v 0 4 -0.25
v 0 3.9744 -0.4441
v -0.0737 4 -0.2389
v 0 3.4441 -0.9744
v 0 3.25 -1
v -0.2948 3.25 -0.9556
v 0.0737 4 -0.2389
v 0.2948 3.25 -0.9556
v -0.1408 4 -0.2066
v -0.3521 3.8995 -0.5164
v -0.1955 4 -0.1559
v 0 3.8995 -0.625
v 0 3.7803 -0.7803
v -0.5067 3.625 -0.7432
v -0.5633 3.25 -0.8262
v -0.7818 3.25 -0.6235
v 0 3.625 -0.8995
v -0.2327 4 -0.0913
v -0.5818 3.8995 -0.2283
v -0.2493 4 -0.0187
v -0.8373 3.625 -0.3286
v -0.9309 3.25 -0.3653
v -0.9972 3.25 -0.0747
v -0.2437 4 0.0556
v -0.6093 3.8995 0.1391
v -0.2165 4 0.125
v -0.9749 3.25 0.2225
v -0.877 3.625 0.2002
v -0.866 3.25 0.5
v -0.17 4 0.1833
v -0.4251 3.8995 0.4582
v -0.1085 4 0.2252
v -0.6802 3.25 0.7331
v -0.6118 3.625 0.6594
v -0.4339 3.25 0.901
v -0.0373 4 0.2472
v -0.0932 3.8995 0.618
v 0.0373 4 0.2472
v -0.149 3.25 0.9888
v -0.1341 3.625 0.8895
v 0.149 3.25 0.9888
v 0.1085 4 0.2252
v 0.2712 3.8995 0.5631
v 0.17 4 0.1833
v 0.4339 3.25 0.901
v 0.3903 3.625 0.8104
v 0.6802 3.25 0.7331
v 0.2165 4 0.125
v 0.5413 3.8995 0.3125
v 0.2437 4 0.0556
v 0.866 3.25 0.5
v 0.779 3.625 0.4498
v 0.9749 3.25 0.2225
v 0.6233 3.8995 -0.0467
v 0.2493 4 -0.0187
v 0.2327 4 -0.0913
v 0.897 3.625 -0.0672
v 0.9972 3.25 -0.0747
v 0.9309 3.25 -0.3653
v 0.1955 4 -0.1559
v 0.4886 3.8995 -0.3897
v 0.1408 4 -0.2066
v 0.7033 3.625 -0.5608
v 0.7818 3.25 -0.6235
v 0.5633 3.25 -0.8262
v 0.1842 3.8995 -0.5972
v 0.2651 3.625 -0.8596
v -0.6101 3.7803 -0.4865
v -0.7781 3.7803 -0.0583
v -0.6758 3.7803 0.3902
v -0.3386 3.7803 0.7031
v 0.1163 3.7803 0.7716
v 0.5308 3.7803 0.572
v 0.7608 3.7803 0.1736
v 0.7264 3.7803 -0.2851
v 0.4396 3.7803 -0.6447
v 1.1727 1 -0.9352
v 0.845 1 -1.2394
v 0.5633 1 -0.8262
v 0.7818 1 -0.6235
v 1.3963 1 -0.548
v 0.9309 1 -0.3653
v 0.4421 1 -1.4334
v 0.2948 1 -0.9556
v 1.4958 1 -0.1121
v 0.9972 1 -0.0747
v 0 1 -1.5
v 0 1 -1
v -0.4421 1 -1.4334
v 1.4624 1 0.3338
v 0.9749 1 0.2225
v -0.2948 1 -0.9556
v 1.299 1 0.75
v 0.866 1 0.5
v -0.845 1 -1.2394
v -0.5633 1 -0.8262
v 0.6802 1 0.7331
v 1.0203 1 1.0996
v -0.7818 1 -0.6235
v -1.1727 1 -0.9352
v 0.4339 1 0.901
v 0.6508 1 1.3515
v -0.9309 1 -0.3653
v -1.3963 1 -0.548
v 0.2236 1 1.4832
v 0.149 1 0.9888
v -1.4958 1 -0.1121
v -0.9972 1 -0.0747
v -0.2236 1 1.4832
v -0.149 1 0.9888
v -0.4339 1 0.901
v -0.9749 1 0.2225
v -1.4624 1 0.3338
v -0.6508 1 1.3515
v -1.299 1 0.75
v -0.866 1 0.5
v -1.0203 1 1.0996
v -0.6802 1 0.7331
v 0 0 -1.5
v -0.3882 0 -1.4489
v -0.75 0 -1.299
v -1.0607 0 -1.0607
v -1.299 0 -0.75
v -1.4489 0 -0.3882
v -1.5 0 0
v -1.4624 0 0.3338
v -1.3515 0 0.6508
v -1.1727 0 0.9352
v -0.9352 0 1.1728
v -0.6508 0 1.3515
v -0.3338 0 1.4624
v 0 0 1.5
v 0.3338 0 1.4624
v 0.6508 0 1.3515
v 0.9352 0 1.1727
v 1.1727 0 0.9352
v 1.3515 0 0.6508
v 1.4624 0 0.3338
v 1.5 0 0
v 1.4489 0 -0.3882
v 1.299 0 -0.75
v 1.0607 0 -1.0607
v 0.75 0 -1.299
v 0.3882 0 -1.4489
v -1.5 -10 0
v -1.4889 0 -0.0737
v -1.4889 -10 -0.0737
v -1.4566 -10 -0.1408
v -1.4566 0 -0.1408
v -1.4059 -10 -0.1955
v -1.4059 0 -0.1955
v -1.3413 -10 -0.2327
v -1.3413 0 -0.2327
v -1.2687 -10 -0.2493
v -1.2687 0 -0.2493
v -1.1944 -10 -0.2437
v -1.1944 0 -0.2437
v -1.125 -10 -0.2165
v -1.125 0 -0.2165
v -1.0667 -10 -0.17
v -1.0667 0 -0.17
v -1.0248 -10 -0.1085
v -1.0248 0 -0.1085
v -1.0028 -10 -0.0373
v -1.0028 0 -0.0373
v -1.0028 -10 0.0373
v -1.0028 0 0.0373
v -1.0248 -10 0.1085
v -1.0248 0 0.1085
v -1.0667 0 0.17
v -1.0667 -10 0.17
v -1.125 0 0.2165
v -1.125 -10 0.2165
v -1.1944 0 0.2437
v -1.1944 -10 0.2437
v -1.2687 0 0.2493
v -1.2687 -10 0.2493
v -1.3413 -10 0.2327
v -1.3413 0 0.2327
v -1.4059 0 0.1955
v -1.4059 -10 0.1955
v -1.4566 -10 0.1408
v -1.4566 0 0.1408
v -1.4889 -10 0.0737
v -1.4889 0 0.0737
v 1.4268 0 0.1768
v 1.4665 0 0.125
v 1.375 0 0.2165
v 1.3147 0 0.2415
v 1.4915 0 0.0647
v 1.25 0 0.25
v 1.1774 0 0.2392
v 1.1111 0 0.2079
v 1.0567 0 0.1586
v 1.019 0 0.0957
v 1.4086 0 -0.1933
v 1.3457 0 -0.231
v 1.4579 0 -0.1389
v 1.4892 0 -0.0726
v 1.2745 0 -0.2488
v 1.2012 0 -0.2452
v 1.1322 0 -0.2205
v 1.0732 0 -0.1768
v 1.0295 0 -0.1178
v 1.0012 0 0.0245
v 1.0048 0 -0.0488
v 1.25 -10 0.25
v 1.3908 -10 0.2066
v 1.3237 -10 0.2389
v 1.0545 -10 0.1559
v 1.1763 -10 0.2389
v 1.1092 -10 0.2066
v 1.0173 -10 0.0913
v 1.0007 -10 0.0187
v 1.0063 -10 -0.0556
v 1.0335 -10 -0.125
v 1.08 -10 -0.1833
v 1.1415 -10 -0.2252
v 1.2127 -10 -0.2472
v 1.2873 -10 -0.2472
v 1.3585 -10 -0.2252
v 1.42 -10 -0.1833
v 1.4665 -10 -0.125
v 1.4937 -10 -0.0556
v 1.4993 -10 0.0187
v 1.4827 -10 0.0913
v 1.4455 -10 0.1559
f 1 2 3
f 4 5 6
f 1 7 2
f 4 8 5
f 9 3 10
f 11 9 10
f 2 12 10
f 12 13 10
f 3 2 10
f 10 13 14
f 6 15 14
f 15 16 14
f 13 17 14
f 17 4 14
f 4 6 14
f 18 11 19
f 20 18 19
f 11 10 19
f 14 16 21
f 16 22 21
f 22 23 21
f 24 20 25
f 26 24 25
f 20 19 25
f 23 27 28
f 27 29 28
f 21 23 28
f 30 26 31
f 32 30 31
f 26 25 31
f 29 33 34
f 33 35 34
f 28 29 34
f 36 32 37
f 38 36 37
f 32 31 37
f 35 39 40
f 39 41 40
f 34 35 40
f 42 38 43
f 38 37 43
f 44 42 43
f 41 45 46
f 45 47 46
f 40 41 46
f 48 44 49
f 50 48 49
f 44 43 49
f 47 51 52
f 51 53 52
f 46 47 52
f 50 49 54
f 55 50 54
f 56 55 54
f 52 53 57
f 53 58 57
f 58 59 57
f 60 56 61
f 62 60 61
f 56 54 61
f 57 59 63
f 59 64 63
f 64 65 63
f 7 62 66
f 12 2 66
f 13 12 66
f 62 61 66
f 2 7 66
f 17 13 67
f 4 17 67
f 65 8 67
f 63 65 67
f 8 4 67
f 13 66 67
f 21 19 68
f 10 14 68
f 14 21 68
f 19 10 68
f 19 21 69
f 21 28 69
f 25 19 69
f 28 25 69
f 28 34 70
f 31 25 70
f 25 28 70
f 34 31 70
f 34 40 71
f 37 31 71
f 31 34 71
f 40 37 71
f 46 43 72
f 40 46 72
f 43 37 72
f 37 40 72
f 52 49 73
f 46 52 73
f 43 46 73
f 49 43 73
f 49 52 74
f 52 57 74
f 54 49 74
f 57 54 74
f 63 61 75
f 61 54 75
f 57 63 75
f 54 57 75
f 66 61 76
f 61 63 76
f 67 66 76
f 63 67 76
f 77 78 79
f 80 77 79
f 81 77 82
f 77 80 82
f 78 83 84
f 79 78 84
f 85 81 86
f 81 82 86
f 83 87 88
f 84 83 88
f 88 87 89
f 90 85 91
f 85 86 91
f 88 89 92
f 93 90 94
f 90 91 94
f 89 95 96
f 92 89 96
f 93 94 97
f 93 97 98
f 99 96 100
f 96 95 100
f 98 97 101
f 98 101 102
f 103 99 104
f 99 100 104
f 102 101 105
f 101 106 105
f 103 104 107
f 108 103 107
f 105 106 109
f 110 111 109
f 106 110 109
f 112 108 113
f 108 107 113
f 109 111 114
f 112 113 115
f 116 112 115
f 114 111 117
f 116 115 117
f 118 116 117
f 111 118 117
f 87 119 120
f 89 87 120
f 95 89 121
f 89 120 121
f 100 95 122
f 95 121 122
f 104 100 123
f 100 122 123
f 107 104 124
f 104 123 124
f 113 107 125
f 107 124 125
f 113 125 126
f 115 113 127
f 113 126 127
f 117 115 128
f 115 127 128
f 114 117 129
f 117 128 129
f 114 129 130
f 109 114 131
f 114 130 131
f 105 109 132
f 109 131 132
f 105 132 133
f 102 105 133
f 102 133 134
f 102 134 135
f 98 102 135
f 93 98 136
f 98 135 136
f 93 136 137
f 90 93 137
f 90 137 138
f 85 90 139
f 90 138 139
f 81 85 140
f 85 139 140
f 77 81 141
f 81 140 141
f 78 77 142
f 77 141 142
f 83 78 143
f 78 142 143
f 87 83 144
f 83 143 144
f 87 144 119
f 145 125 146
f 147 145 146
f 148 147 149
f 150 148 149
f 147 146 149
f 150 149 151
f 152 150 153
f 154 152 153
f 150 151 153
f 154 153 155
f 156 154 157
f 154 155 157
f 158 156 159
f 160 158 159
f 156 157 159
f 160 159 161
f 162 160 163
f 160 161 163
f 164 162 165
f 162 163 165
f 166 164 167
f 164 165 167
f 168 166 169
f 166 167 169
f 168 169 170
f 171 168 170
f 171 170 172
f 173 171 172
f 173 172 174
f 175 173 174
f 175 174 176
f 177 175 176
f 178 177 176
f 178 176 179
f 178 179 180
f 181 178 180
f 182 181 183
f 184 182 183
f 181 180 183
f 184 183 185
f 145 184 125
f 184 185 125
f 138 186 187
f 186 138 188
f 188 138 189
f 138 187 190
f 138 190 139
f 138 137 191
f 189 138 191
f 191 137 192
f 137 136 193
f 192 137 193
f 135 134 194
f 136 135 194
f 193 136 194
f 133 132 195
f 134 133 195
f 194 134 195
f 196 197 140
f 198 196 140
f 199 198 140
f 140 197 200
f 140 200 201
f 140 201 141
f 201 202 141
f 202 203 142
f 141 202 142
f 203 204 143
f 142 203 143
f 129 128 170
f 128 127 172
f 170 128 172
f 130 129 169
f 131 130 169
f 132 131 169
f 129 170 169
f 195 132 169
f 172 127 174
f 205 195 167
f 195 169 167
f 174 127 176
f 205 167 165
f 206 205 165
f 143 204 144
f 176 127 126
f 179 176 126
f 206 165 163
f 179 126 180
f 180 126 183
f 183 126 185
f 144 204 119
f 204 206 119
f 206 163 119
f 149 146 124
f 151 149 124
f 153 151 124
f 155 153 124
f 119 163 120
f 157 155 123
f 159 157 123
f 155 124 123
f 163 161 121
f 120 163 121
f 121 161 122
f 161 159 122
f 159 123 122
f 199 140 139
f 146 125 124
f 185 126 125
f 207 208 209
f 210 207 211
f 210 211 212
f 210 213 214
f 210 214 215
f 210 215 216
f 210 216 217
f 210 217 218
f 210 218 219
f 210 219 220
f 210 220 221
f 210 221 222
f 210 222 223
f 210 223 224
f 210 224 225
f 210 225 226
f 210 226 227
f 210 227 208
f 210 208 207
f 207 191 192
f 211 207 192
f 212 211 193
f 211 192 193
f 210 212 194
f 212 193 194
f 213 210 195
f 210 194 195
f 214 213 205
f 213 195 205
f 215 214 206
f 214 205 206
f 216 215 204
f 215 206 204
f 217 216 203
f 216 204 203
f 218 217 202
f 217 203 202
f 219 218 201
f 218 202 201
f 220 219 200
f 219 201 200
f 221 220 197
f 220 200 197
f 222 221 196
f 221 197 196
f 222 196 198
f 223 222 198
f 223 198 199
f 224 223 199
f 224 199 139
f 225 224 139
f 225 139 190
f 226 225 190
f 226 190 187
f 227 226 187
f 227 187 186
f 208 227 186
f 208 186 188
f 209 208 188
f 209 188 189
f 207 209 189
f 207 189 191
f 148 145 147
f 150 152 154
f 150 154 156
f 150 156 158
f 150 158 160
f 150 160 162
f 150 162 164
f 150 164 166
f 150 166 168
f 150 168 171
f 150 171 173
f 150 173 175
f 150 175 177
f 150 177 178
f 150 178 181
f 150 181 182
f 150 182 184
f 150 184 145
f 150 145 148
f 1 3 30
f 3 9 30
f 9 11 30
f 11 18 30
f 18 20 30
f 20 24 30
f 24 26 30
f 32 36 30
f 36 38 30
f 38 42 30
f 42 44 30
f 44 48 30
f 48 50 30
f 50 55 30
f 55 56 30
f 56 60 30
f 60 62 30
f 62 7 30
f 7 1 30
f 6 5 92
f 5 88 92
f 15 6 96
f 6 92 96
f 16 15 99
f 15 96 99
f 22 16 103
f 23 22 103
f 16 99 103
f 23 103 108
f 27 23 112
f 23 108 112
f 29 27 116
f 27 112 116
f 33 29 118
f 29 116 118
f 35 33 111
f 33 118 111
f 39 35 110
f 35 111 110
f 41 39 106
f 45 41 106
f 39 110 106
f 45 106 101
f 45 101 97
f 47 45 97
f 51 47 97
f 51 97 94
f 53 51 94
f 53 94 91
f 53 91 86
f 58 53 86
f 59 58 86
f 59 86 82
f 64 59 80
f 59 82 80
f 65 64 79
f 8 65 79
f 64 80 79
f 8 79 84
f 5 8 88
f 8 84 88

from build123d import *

# Parameters (mm, degrees)
ESBO_O2_R                = 0.25
RESSALTO_EXTRUS_O1_DEPTH = 10


with BuildPart() as part:
    # Esboço1 → Revolução1 (revolve)
    with BuildSketch(Plane.XY, mode=Mode.PRIVATE) as revolu_o1_sk:
        with BuildLine():
            Line((0, 4), (0.25, 4))
            ThreePointArc((0.25, 4), (0.780330086, 3.780330086), (1, 3.25))
            Line((1, 3.25), (1, 1))
            Line((1, 1), (1.5, 1))
            Line((1.5, 1), (1.5, 0))
            Line((1.5, 0), (0, 0))
            Line((0, 0), (0, 4))
        make_face()
    revolve(revolu_o1_sk.sketch.rotate(Axis((0, 0, 0), (0, 1, 0)), 90), axis=Axis((0, 0, 0), (0, 1, 0)))

    # Esboço2 → Ressalto-extrusão1 (add)
    with BuildSketch(Plane.XZ):
        with Locations(Location((-1.25, 0, 0), (0, 0, 179.998224755))):
            Circle(ESBO_O2_R)
        with Locations(Location((1.25, 0, 0), (0, 0, 90))):
            Circle(ESBO_O2_R)
    extrude(amount=RESSALTO_EXTRUS_O1_DEPTH)


solid = part.part
